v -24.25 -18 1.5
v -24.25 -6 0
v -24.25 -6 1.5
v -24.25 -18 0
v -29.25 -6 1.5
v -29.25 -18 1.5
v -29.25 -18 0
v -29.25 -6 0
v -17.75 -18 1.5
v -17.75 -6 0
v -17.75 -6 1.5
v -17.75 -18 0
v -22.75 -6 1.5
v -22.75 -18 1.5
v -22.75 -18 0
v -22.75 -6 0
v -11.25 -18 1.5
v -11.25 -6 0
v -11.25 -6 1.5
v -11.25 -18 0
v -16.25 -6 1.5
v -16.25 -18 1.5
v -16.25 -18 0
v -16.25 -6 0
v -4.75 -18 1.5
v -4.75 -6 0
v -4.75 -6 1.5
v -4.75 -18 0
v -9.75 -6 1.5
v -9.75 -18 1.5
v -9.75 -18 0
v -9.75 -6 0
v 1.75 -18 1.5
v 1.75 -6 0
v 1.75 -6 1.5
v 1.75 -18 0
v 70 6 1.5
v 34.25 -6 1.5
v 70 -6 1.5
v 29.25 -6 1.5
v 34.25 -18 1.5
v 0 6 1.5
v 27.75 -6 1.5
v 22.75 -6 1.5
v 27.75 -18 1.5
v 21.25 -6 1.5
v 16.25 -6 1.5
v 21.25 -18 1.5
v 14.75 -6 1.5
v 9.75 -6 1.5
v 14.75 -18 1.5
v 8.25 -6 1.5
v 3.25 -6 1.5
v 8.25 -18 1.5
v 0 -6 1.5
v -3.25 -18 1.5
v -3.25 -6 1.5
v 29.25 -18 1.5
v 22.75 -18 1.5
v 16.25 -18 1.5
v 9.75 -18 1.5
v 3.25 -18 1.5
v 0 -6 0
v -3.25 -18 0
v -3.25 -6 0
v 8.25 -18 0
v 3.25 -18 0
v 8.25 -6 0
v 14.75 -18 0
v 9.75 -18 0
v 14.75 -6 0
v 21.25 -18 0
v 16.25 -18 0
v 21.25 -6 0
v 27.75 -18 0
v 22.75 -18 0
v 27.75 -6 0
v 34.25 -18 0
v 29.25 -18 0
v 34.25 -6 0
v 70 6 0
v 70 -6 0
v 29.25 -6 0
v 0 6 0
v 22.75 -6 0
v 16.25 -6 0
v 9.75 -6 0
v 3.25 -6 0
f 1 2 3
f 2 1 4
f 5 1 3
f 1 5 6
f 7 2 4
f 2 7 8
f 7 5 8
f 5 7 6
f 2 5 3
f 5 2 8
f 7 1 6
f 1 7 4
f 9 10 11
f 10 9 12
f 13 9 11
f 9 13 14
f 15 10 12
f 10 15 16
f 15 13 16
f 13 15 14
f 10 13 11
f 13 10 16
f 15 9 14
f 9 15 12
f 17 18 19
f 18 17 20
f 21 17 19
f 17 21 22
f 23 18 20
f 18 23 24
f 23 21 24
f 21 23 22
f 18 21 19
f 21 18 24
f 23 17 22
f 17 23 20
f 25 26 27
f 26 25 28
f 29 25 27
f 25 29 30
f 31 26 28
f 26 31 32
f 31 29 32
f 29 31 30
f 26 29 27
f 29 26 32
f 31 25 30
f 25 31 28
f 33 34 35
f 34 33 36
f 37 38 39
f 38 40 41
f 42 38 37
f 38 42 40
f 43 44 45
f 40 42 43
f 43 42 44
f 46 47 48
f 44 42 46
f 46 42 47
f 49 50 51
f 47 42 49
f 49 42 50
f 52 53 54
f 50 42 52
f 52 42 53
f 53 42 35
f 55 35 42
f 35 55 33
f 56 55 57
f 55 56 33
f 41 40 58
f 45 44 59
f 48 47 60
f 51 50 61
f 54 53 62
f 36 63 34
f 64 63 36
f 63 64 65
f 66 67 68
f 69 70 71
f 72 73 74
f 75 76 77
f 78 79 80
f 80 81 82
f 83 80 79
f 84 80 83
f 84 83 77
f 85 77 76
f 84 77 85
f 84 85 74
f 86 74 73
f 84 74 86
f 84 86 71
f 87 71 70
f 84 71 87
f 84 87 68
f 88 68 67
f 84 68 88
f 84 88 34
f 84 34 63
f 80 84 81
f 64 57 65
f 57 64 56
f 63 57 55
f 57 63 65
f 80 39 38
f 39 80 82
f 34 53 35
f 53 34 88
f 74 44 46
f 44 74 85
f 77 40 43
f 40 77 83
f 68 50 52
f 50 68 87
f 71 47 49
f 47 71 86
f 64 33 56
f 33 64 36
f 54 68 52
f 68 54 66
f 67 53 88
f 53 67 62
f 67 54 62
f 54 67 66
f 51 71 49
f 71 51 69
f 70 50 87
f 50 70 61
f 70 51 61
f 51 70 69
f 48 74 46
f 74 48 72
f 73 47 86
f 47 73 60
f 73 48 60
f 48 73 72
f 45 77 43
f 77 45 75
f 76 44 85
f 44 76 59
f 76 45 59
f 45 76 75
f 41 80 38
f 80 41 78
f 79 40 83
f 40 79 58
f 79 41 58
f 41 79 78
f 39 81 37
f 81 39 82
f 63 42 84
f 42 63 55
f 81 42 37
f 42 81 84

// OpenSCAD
// 10-well comb for agarose gel casting
// Print orientation: flat on XY plane, Z = 0

thickness = 1.5;      // mm, comb thickness (Z)
spine_length = 70;    // mm, X direction (length of back bar)
spine_width = 12;     // mm, Y direction (width of back bar)
num_wells = 10;       // number of teeth/wells
tooth_width = 5.0;    // mm, X direction (width of each tooth)
tooth_length = 12;    // mm, Y direction (length of each tooth, hanging down in -Y)
gap_width = 1.5;      // mm, gap between neighbouring teeth

// Calculate total width of teeth + gaps
total_tooth_width = num_wells * tooth_width;
total_gap_width = (num_wells - 1) * gap_width;
teeth_row_width = total_tooth_width + total_gap_width;

// Center the teeth row on the spine (which is spine_width wide)
// Spine is centered at X=0, so teeth row should be centered at X=0 too
teeth_row_x_start = -teeth_row_width / 2;
tooth_spacing = tooth_width + gap_width;

// Build comb
module comb() {
    // Back bar (spine)
    translate([0, -spine_width/2, 0])
        cube([spine_length, spine_width, thickness]);
    
    // Teeth (10 rectangular teeth hanging from -Y edge)
    for (i = [0 : num_wells - 1]) {
        // X position of each tooth (centered on the spine)
        tooth_x = teeth_row_x_start + i * tooth_spacing + tooth_width/2;
        
        // Position tooth: X is tooth_x, Y starts at spine edge (-spine_width/2) and extends in -Y direction
        translate([tooth_x, -spine_width/2 - tooth_length, 0])
            cube([tooth_width, tooth_length, thickness]);
    }
}

// Render
comb();
